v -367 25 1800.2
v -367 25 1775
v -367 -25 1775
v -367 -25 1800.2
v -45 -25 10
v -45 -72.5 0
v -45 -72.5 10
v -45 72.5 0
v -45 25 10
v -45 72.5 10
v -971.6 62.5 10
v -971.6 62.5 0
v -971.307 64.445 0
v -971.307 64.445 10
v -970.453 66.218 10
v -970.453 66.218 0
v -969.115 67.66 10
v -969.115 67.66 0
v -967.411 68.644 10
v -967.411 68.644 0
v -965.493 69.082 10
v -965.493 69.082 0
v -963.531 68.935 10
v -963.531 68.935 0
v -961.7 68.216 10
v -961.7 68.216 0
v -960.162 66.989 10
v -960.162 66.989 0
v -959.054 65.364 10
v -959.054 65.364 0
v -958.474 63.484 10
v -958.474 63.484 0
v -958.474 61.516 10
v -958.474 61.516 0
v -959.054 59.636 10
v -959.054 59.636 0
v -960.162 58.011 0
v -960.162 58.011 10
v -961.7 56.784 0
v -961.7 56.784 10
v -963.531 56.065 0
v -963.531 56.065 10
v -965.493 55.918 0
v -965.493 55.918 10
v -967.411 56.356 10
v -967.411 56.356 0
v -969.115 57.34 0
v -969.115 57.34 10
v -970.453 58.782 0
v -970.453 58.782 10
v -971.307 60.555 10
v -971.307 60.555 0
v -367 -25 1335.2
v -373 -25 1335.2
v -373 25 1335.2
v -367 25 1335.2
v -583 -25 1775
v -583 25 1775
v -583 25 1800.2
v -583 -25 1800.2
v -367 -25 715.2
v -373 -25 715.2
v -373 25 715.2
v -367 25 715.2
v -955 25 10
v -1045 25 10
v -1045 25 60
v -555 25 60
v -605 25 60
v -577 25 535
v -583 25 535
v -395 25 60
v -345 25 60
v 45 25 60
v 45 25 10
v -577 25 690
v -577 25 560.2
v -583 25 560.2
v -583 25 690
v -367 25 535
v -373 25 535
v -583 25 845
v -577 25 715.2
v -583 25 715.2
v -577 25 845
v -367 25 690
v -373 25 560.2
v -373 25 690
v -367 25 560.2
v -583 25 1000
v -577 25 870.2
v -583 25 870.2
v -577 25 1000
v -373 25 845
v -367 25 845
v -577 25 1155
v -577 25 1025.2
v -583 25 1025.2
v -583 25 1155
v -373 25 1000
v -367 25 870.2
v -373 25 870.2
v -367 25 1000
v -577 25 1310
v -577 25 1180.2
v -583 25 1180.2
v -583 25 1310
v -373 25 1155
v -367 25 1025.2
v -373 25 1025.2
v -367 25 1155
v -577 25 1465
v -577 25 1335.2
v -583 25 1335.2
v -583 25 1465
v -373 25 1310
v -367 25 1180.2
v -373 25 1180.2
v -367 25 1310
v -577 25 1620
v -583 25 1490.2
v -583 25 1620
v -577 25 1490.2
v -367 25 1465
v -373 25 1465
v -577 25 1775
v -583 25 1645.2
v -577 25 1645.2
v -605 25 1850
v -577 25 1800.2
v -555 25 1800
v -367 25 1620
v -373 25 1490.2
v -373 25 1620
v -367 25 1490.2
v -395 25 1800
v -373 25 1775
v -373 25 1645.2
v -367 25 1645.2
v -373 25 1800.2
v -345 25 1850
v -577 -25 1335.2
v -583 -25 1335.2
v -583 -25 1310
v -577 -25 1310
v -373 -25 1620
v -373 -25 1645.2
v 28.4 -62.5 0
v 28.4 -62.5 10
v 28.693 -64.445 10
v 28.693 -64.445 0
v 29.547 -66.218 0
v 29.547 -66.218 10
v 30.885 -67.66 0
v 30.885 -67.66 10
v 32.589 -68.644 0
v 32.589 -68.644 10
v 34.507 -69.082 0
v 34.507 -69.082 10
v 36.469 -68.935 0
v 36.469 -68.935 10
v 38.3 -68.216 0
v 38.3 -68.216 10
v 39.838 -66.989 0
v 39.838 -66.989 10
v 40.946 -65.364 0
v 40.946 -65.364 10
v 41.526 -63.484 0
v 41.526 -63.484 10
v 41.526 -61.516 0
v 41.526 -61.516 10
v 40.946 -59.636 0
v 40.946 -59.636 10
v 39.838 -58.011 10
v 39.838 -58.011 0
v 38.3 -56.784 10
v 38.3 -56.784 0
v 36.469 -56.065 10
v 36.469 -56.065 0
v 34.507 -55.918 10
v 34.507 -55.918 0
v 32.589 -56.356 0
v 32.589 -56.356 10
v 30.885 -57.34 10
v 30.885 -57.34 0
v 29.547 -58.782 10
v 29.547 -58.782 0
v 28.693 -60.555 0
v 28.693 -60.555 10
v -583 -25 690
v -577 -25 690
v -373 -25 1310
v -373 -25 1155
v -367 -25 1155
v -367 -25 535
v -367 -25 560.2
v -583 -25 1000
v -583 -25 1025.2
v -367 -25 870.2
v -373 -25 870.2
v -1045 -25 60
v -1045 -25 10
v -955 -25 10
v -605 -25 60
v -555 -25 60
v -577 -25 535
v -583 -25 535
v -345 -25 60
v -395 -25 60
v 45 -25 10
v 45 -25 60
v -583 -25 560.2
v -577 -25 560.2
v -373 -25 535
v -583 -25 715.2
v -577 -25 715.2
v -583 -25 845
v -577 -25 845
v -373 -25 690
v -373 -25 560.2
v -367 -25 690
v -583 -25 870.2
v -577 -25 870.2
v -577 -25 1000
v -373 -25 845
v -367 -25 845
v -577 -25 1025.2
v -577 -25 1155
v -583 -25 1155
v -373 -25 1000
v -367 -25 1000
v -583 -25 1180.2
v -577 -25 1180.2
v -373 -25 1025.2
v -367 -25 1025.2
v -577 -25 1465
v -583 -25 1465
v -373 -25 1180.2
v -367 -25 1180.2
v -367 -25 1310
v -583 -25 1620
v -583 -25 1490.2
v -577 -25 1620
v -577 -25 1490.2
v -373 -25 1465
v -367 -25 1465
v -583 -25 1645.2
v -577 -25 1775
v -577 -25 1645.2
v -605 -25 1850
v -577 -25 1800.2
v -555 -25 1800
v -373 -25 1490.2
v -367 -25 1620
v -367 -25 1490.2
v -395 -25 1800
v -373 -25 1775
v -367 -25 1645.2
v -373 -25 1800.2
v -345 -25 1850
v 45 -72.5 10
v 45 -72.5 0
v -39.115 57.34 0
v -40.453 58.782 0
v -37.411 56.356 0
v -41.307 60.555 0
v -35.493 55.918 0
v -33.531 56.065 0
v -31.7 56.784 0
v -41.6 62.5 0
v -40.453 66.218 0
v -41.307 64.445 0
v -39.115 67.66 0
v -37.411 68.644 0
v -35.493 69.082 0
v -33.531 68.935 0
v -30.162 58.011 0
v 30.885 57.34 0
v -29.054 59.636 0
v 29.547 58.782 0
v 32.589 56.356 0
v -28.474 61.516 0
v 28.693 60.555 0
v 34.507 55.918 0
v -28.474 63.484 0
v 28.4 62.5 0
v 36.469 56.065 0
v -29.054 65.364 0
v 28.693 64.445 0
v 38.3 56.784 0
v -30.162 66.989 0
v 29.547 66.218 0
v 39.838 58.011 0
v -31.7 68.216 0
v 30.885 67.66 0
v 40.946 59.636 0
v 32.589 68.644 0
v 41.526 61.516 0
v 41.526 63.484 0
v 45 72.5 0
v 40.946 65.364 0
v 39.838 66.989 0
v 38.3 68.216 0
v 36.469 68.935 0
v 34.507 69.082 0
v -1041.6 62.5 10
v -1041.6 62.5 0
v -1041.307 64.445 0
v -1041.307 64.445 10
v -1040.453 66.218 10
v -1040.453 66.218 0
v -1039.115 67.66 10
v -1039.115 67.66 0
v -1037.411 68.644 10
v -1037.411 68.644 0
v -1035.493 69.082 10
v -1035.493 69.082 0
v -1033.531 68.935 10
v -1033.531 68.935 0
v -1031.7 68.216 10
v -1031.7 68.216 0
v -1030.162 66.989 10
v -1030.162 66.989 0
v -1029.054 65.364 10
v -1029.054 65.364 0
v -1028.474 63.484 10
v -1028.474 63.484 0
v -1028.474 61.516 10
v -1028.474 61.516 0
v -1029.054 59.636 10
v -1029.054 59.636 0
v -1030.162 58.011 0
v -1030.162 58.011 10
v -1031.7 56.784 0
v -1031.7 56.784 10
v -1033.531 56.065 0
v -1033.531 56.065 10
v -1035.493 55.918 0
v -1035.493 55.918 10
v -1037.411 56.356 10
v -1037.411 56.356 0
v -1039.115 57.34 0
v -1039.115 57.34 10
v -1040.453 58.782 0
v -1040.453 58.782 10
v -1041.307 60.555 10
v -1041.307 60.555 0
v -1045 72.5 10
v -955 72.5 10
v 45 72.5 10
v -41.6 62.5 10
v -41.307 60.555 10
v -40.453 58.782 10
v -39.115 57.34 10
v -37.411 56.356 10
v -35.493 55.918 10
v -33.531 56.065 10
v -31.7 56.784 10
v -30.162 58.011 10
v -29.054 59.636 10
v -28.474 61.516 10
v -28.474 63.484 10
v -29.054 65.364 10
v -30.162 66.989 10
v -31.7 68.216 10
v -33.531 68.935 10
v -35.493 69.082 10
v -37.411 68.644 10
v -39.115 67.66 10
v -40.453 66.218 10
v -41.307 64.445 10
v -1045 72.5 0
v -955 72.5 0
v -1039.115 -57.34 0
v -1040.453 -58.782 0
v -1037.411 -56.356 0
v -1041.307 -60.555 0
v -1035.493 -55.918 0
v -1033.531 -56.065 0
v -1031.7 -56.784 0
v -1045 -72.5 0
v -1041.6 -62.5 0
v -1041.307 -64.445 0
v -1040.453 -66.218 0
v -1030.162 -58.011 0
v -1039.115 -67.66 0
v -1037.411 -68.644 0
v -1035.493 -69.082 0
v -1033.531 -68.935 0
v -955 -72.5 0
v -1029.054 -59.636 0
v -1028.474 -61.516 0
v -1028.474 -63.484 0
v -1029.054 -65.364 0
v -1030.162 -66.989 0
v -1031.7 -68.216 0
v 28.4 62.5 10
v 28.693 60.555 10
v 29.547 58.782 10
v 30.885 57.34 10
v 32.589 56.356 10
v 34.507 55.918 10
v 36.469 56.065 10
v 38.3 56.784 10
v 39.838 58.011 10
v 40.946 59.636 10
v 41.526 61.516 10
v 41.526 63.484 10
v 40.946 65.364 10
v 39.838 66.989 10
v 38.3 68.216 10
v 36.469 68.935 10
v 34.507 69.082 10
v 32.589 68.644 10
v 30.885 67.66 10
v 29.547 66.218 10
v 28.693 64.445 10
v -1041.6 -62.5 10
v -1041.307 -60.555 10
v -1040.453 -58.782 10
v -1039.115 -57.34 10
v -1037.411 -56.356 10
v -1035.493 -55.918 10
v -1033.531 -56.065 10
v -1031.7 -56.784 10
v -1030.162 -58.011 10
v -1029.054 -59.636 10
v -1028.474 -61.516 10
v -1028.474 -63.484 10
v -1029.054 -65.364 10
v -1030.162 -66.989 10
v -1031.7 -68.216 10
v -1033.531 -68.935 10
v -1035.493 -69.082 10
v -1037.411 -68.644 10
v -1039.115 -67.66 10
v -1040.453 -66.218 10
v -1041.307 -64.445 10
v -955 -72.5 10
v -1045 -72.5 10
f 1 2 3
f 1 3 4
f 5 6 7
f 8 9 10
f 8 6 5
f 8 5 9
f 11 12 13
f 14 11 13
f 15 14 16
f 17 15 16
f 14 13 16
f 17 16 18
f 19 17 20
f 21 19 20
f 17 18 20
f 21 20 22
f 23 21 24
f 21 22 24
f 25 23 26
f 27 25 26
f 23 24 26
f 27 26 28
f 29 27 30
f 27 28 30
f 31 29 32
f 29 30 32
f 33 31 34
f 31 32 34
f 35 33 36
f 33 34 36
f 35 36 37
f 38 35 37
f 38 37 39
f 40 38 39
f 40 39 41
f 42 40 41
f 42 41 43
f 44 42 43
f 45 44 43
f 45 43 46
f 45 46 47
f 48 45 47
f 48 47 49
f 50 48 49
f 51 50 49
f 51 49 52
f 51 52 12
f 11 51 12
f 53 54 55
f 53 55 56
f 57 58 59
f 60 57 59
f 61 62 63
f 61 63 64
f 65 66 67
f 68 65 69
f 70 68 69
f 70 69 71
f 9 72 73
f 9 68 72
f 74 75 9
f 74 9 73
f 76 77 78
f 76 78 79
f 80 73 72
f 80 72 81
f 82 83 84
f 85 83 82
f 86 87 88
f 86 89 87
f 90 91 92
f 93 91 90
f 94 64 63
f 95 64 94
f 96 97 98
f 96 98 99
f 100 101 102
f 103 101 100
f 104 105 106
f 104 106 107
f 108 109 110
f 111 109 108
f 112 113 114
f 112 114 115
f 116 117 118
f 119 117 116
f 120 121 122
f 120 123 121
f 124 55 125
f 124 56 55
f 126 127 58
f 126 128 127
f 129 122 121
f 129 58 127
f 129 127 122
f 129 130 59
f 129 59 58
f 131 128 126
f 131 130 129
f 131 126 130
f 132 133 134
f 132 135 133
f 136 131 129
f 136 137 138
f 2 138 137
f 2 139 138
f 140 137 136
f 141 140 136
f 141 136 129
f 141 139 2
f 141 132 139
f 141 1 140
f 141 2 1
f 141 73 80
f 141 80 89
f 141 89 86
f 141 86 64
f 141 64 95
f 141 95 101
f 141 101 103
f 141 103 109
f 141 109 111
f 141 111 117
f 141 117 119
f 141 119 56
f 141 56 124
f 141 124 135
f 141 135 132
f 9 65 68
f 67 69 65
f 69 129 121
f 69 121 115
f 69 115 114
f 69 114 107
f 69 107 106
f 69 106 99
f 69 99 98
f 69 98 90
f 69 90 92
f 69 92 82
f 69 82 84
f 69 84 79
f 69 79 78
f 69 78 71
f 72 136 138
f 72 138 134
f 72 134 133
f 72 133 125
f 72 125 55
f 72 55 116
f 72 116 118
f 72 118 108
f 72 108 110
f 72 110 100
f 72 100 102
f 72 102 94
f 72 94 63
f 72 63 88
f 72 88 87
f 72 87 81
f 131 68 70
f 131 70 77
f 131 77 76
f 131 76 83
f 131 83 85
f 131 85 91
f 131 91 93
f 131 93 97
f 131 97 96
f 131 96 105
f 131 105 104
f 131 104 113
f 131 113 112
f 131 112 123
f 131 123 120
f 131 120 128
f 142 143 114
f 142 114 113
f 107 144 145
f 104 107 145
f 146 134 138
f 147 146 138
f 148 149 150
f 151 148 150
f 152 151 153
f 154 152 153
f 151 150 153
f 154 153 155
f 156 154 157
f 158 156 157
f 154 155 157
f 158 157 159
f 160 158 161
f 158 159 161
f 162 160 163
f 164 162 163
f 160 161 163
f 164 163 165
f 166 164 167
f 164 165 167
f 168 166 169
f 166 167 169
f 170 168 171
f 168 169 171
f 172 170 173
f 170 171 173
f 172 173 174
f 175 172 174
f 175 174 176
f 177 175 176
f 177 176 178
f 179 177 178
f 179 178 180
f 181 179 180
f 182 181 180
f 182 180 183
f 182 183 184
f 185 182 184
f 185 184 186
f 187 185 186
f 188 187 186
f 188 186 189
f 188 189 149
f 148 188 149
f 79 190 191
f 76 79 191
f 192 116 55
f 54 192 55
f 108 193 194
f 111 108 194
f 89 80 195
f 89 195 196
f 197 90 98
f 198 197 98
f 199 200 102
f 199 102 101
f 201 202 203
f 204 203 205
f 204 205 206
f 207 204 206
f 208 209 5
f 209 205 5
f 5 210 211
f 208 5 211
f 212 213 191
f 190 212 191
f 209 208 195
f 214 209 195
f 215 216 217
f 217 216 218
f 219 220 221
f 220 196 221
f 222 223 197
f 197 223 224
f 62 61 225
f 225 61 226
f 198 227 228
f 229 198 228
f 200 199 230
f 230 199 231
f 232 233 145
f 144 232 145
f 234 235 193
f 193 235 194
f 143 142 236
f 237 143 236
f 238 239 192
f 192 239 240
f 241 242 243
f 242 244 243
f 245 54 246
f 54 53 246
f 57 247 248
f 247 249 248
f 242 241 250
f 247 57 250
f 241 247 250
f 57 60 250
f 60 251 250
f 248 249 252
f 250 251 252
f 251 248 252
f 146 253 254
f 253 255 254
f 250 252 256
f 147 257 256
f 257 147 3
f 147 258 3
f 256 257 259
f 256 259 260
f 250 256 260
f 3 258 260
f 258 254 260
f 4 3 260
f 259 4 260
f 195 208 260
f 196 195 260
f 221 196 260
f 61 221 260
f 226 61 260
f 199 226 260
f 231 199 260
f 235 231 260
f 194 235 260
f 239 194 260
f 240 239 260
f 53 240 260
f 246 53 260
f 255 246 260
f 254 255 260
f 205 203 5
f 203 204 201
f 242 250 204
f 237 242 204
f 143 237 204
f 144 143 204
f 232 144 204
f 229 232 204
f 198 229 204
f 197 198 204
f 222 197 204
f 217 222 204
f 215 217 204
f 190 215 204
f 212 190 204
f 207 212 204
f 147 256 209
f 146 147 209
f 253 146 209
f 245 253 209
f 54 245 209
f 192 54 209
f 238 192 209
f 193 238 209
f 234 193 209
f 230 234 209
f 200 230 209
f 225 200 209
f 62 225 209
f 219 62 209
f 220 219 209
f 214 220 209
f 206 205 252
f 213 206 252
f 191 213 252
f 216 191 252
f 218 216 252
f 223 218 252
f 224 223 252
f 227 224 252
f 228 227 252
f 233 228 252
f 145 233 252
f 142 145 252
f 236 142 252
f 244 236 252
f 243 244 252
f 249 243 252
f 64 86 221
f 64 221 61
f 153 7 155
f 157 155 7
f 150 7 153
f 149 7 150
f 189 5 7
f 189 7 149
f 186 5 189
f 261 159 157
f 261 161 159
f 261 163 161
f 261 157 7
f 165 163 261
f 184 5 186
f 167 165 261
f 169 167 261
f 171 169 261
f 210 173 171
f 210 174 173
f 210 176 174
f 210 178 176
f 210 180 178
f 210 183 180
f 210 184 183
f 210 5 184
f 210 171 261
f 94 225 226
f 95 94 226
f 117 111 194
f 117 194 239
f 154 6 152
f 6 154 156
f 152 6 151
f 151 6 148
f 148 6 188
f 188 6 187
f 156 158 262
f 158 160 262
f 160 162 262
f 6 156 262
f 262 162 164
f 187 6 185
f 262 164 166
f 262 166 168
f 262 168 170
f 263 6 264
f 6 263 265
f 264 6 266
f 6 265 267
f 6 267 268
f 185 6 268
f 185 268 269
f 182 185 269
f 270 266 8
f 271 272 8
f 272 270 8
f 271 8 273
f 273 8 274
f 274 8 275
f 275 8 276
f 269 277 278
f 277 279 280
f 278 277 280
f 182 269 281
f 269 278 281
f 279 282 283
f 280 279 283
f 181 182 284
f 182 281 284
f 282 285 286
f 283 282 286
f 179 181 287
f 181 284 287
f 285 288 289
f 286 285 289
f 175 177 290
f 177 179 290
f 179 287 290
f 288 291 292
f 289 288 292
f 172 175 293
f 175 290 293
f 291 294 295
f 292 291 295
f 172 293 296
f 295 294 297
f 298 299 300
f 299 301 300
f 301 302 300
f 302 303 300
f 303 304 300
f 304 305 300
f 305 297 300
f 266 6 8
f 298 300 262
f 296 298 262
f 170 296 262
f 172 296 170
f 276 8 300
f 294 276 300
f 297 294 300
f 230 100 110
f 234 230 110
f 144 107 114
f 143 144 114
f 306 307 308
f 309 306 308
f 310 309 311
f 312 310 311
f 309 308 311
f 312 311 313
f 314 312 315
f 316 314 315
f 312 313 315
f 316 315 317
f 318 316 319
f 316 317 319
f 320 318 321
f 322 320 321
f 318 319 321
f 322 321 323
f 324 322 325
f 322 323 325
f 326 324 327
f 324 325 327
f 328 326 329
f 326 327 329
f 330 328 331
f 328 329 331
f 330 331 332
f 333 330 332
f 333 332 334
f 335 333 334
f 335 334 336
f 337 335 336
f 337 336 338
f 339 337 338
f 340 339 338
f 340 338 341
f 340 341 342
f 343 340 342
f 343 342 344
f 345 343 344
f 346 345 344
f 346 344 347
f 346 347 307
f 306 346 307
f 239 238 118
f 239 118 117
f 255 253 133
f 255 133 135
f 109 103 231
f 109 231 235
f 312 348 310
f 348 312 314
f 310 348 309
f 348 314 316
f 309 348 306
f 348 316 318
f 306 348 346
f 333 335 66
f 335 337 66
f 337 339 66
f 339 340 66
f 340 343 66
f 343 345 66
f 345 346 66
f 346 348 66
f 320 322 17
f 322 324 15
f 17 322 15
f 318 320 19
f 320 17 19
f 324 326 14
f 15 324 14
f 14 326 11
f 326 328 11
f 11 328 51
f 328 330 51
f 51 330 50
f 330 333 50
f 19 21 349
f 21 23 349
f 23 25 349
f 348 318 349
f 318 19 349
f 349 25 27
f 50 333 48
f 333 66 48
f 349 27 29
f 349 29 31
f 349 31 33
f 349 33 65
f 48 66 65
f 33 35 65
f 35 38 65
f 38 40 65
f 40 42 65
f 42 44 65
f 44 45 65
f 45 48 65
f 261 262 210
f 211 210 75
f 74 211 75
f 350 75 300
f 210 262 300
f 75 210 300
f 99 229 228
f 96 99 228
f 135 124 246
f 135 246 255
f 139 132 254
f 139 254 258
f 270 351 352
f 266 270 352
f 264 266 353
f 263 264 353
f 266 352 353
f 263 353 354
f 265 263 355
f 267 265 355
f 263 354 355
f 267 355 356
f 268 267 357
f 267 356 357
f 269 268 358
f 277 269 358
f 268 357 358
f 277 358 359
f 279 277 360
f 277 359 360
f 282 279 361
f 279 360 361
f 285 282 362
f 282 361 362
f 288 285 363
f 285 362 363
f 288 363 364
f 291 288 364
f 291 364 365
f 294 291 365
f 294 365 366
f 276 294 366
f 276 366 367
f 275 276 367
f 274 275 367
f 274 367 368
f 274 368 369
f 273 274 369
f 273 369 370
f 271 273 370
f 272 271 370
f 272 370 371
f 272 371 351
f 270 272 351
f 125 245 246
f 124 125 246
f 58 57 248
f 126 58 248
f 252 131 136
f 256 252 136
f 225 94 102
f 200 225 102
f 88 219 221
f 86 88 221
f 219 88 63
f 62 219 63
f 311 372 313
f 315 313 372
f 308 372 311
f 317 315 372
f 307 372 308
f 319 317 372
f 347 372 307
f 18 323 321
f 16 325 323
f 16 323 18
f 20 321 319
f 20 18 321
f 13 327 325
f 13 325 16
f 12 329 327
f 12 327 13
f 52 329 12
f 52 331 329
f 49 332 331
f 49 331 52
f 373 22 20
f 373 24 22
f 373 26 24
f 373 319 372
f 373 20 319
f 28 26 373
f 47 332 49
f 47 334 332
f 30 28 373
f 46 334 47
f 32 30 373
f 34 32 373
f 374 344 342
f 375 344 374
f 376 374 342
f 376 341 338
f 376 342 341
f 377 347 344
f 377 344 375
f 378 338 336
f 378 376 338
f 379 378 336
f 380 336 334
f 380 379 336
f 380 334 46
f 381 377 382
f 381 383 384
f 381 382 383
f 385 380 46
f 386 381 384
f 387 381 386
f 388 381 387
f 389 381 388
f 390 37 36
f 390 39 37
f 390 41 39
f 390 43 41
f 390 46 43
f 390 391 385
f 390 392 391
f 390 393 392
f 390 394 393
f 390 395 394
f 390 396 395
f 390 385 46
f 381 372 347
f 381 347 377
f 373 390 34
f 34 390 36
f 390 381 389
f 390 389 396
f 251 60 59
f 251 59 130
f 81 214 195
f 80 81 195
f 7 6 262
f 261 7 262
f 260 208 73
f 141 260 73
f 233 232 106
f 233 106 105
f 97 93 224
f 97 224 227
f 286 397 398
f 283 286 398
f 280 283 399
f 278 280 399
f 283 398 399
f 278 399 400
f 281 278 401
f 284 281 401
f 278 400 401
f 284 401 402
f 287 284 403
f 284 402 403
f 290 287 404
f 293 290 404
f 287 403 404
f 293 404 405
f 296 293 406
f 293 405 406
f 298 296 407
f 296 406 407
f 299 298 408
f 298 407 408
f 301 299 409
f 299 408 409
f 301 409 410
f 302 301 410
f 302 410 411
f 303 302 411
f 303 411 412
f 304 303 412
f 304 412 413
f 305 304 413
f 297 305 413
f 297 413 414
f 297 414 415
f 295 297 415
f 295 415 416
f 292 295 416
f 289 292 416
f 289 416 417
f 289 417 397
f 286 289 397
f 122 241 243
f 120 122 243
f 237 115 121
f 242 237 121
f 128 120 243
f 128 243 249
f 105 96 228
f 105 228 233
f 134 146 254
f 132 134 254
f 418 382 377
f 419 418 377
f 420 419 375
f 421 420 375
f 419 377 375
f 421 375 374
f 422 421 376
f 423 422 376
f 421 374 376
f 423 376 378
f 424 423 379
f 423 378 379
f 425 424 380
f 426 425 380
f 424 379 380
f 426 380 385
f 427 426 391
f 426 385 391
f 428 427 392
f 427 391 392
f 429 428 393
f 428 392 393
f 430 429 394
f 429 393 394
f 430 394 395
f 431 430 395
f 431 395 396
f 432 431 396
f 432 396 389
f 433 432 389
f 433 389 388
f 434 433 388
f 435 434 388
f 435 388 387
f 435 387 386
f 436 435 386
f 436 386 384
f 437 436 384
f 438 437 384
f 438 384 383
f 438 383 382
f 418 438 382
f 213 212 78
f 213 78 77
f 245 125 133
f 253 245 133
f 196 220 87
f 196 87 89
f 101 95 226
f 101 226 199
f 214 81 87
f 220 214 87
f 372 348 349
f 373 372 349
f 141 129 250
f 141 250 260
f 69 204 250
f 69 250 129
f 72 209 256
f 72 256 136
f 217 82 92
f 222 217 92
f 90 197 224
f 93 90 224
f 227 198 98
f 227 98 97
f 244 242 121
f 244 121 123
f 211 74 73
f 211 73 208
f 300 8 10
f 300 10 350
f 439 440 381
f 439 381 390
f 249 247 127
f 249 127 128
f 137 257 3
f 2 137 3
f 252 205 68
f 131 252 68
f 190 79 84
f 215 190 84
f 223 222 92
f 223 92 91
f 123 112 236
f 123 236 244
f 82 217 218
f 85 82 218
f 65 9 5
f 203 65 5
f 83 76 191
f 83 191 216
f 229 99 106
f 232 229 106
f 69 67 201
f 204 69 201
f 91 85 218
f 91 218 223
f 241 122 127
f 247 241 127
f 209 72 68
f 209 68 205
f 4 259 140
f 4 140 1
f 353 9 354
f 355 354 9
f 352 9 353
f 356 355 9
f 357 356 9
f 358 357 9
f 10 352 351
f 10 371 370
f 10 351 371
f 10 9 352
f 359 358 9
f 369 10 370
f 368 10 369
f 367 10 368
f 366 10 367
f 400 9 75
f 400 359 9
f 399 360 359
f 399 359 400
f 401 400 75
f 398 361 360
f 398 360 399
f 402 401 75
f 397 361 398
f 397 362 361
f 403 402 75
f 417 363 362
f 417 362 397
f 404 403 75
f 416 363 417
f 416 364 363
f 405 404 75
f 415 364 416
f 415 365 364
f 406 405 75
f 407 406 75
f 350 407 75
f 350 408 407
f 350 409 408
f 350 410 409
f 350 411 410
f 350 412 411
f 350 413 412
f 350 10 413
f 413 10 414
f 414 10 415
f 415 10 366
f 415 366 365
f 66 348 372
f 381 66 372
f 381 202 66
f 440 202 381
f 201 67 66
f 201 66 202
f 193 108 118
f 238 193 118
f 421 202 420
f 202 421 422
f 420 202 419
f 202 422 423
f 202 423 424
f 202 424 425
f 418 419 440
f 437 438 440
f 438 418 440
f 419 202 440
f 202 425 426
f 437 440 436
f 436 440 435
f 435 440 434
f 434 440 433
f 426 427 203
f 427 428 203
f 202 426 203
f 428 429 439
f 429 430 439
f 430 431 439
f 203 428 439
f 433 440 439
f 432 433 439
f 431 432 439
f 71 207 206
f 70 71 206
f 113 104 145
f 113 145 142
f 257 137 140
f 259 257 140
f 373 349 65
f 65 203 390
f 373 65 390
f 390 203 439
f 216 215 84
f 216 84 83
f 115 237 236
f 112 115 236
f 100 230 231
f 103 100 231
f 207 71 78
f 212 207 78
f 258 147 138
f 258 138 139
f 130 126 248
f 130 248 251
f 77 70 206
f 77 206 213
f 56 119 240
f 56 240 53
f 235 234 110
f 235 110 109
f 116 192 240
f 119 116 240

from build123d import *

# Parameters (mm, degrees)
F0_W      = 90
F0_H      = 145
F1_DEPTH  = 10
F3_D      = 13.2
F4_W      = 90
F4_H      = 50
F5_DEPTH  = 50
F6_W      = 50
F6_H      = 50
F7_DEPTH  = 1000
F8_W      = 90
F8_H      = 145
F9_DEPTH  = 10
F11_D     = 13.2
F12_W     = 50
F12_H     = 50
F13_DEPTH = 1790
F14_W     = 260
F14_H     = 50
F15_DEPTH = 50
F16_W     = 6
F16_H     = 25.2000307604
F17_DEPTH = 97.501


with BuildPart() as f1:
    # F0 (on Top) → F1 (new body)
    with BuildSketch(Plane.XY):
        Rectangle(F0_W, F0_H)
    extrude(amount=F1_DEPTH)

    # F3 (through all)
    with Locations(Plane(origin=(0, 0, 0), x_dir=(1, 0, 0), z_dir=(0, 0, -1))):
        with Locations((35, -62.5), (35, 62.5), (-35, -62.5)):
            Hole(F3_D / 2)

    # F4 (on face) → F5 (join)
    with BuildSketch(Plane.XY.offset(10)):
        Rectangle(F4_W, F4_H)
    extrude(amount=F5_DEPTH)

    # F6 (on face) → F7 (join)
    with BuildSketch(Plane(origin=(-45, 0, 0), x_dir=(0, -1, 0), z_dir=(-1, 0, 0))):
        with Locations((0, 35)):
            Rectangle(F6_W, F6_H)
    extrude(amount=F7_DEPTH)

    # F8 (on face) → F9 (join)
    with BuildSketch(Plane(origin=(0, 0, 10), x_dir=(1, 0, 0), z_dir=(0, 0, -1))):
        with Locations((-1000, 0)):
            Rectangle(F8_W, F8_H)
    extrude(amount=F9_DEPTH)

    # F11 (through all)
    with Locations(Plane.XY.offset(10)):
        with Locations((-965, 62.5), (-1035, -62.5), (-1035, 62.5)):
            Hole(F11_D / 2)

    # F12 (on face) → F13 (join)
    with BuildSketch(Plane.XY.offset(60)):
        with Locations((-370, 0)):
            Rectangle(F12_W, F12_H)
        with Locations((-580, 0)):
            Rectangle(F12_W, F12_H)
    extrude(amount=F13_DEPTH)

    # F14 (on face) → F15 (join)
    with BuildSketch(Plane.XY.offset(1850)):
        with Locations((-475, 0)):
            Rectangle(F14_W, F14_H)
    extrude(amount=-F15_DEPTH)

    # F16 (on face) → F17 (cut, through all)
    with BuildSketch(Plane.XZ.offset(25)):
        with Locations((-370, 547.6000153802)):
            Rectangle(F16_W, F16_H)
        with Locations((-370, 702.6000153802)):
            Rectangle(F16_W, F16_H)
        with Locations((-370, 857.6000153802)):
            Rectangle(F16_W, F16_H)
        with Locations((-370, 1012.6000153802)):
            Rectangle(F16_W, F16_H)
        with Locations((-370, 1167.6000153802)):
            Rectangle(F16_W, F16_H)
        with Locations((-370, 1322.6000153802)):
            Rectangle(F16_W, F16_H)
        with Locations((-370, 1477.6000153802)):
            Rectangle(F16_W, F16_H)
        with Locations((-370, 1632.6000153802)):
            Rectangle(F16_W, F16_H)
        with Locations((-370, 1787.6000153802)):
            Rectangle(F16_W, F16_H)
        with Locations((-580, 547.6000153802)):
            Rectangle(F16_W, F16_H)
        with Locations((-580, 702.6000153802)):
            Rectangle(F16_W, F16_H)
        with Locations((-580, 857.6000153802)):
            Rectangle(F16_W, F16_H)
        with Locations((-580, 1012.6000153802)):
            Rectangle(F16_W, F16_H)
        with Locations((-580, 1167.6000153802)):
            Rectangle(F16_W, F16_H)
        with Locations((-580, 1322.6000153802)):
            Rectangle(F16_W, F16_H)
        with Locations((-580, 1477.6000153802)):
            Rectangle(F16_W, F16_H)
        with Locations((-580, 1632.6000153802)):
            Rectangle(F16_W, F16_H)
        with Locations((-580, 1787.6000153802)):
            Rectangle(F16_W, F16_H)
    extrude(amount=-F17_DEPTH, mode=Mode.SUBTRACT)


solid = f1.part
